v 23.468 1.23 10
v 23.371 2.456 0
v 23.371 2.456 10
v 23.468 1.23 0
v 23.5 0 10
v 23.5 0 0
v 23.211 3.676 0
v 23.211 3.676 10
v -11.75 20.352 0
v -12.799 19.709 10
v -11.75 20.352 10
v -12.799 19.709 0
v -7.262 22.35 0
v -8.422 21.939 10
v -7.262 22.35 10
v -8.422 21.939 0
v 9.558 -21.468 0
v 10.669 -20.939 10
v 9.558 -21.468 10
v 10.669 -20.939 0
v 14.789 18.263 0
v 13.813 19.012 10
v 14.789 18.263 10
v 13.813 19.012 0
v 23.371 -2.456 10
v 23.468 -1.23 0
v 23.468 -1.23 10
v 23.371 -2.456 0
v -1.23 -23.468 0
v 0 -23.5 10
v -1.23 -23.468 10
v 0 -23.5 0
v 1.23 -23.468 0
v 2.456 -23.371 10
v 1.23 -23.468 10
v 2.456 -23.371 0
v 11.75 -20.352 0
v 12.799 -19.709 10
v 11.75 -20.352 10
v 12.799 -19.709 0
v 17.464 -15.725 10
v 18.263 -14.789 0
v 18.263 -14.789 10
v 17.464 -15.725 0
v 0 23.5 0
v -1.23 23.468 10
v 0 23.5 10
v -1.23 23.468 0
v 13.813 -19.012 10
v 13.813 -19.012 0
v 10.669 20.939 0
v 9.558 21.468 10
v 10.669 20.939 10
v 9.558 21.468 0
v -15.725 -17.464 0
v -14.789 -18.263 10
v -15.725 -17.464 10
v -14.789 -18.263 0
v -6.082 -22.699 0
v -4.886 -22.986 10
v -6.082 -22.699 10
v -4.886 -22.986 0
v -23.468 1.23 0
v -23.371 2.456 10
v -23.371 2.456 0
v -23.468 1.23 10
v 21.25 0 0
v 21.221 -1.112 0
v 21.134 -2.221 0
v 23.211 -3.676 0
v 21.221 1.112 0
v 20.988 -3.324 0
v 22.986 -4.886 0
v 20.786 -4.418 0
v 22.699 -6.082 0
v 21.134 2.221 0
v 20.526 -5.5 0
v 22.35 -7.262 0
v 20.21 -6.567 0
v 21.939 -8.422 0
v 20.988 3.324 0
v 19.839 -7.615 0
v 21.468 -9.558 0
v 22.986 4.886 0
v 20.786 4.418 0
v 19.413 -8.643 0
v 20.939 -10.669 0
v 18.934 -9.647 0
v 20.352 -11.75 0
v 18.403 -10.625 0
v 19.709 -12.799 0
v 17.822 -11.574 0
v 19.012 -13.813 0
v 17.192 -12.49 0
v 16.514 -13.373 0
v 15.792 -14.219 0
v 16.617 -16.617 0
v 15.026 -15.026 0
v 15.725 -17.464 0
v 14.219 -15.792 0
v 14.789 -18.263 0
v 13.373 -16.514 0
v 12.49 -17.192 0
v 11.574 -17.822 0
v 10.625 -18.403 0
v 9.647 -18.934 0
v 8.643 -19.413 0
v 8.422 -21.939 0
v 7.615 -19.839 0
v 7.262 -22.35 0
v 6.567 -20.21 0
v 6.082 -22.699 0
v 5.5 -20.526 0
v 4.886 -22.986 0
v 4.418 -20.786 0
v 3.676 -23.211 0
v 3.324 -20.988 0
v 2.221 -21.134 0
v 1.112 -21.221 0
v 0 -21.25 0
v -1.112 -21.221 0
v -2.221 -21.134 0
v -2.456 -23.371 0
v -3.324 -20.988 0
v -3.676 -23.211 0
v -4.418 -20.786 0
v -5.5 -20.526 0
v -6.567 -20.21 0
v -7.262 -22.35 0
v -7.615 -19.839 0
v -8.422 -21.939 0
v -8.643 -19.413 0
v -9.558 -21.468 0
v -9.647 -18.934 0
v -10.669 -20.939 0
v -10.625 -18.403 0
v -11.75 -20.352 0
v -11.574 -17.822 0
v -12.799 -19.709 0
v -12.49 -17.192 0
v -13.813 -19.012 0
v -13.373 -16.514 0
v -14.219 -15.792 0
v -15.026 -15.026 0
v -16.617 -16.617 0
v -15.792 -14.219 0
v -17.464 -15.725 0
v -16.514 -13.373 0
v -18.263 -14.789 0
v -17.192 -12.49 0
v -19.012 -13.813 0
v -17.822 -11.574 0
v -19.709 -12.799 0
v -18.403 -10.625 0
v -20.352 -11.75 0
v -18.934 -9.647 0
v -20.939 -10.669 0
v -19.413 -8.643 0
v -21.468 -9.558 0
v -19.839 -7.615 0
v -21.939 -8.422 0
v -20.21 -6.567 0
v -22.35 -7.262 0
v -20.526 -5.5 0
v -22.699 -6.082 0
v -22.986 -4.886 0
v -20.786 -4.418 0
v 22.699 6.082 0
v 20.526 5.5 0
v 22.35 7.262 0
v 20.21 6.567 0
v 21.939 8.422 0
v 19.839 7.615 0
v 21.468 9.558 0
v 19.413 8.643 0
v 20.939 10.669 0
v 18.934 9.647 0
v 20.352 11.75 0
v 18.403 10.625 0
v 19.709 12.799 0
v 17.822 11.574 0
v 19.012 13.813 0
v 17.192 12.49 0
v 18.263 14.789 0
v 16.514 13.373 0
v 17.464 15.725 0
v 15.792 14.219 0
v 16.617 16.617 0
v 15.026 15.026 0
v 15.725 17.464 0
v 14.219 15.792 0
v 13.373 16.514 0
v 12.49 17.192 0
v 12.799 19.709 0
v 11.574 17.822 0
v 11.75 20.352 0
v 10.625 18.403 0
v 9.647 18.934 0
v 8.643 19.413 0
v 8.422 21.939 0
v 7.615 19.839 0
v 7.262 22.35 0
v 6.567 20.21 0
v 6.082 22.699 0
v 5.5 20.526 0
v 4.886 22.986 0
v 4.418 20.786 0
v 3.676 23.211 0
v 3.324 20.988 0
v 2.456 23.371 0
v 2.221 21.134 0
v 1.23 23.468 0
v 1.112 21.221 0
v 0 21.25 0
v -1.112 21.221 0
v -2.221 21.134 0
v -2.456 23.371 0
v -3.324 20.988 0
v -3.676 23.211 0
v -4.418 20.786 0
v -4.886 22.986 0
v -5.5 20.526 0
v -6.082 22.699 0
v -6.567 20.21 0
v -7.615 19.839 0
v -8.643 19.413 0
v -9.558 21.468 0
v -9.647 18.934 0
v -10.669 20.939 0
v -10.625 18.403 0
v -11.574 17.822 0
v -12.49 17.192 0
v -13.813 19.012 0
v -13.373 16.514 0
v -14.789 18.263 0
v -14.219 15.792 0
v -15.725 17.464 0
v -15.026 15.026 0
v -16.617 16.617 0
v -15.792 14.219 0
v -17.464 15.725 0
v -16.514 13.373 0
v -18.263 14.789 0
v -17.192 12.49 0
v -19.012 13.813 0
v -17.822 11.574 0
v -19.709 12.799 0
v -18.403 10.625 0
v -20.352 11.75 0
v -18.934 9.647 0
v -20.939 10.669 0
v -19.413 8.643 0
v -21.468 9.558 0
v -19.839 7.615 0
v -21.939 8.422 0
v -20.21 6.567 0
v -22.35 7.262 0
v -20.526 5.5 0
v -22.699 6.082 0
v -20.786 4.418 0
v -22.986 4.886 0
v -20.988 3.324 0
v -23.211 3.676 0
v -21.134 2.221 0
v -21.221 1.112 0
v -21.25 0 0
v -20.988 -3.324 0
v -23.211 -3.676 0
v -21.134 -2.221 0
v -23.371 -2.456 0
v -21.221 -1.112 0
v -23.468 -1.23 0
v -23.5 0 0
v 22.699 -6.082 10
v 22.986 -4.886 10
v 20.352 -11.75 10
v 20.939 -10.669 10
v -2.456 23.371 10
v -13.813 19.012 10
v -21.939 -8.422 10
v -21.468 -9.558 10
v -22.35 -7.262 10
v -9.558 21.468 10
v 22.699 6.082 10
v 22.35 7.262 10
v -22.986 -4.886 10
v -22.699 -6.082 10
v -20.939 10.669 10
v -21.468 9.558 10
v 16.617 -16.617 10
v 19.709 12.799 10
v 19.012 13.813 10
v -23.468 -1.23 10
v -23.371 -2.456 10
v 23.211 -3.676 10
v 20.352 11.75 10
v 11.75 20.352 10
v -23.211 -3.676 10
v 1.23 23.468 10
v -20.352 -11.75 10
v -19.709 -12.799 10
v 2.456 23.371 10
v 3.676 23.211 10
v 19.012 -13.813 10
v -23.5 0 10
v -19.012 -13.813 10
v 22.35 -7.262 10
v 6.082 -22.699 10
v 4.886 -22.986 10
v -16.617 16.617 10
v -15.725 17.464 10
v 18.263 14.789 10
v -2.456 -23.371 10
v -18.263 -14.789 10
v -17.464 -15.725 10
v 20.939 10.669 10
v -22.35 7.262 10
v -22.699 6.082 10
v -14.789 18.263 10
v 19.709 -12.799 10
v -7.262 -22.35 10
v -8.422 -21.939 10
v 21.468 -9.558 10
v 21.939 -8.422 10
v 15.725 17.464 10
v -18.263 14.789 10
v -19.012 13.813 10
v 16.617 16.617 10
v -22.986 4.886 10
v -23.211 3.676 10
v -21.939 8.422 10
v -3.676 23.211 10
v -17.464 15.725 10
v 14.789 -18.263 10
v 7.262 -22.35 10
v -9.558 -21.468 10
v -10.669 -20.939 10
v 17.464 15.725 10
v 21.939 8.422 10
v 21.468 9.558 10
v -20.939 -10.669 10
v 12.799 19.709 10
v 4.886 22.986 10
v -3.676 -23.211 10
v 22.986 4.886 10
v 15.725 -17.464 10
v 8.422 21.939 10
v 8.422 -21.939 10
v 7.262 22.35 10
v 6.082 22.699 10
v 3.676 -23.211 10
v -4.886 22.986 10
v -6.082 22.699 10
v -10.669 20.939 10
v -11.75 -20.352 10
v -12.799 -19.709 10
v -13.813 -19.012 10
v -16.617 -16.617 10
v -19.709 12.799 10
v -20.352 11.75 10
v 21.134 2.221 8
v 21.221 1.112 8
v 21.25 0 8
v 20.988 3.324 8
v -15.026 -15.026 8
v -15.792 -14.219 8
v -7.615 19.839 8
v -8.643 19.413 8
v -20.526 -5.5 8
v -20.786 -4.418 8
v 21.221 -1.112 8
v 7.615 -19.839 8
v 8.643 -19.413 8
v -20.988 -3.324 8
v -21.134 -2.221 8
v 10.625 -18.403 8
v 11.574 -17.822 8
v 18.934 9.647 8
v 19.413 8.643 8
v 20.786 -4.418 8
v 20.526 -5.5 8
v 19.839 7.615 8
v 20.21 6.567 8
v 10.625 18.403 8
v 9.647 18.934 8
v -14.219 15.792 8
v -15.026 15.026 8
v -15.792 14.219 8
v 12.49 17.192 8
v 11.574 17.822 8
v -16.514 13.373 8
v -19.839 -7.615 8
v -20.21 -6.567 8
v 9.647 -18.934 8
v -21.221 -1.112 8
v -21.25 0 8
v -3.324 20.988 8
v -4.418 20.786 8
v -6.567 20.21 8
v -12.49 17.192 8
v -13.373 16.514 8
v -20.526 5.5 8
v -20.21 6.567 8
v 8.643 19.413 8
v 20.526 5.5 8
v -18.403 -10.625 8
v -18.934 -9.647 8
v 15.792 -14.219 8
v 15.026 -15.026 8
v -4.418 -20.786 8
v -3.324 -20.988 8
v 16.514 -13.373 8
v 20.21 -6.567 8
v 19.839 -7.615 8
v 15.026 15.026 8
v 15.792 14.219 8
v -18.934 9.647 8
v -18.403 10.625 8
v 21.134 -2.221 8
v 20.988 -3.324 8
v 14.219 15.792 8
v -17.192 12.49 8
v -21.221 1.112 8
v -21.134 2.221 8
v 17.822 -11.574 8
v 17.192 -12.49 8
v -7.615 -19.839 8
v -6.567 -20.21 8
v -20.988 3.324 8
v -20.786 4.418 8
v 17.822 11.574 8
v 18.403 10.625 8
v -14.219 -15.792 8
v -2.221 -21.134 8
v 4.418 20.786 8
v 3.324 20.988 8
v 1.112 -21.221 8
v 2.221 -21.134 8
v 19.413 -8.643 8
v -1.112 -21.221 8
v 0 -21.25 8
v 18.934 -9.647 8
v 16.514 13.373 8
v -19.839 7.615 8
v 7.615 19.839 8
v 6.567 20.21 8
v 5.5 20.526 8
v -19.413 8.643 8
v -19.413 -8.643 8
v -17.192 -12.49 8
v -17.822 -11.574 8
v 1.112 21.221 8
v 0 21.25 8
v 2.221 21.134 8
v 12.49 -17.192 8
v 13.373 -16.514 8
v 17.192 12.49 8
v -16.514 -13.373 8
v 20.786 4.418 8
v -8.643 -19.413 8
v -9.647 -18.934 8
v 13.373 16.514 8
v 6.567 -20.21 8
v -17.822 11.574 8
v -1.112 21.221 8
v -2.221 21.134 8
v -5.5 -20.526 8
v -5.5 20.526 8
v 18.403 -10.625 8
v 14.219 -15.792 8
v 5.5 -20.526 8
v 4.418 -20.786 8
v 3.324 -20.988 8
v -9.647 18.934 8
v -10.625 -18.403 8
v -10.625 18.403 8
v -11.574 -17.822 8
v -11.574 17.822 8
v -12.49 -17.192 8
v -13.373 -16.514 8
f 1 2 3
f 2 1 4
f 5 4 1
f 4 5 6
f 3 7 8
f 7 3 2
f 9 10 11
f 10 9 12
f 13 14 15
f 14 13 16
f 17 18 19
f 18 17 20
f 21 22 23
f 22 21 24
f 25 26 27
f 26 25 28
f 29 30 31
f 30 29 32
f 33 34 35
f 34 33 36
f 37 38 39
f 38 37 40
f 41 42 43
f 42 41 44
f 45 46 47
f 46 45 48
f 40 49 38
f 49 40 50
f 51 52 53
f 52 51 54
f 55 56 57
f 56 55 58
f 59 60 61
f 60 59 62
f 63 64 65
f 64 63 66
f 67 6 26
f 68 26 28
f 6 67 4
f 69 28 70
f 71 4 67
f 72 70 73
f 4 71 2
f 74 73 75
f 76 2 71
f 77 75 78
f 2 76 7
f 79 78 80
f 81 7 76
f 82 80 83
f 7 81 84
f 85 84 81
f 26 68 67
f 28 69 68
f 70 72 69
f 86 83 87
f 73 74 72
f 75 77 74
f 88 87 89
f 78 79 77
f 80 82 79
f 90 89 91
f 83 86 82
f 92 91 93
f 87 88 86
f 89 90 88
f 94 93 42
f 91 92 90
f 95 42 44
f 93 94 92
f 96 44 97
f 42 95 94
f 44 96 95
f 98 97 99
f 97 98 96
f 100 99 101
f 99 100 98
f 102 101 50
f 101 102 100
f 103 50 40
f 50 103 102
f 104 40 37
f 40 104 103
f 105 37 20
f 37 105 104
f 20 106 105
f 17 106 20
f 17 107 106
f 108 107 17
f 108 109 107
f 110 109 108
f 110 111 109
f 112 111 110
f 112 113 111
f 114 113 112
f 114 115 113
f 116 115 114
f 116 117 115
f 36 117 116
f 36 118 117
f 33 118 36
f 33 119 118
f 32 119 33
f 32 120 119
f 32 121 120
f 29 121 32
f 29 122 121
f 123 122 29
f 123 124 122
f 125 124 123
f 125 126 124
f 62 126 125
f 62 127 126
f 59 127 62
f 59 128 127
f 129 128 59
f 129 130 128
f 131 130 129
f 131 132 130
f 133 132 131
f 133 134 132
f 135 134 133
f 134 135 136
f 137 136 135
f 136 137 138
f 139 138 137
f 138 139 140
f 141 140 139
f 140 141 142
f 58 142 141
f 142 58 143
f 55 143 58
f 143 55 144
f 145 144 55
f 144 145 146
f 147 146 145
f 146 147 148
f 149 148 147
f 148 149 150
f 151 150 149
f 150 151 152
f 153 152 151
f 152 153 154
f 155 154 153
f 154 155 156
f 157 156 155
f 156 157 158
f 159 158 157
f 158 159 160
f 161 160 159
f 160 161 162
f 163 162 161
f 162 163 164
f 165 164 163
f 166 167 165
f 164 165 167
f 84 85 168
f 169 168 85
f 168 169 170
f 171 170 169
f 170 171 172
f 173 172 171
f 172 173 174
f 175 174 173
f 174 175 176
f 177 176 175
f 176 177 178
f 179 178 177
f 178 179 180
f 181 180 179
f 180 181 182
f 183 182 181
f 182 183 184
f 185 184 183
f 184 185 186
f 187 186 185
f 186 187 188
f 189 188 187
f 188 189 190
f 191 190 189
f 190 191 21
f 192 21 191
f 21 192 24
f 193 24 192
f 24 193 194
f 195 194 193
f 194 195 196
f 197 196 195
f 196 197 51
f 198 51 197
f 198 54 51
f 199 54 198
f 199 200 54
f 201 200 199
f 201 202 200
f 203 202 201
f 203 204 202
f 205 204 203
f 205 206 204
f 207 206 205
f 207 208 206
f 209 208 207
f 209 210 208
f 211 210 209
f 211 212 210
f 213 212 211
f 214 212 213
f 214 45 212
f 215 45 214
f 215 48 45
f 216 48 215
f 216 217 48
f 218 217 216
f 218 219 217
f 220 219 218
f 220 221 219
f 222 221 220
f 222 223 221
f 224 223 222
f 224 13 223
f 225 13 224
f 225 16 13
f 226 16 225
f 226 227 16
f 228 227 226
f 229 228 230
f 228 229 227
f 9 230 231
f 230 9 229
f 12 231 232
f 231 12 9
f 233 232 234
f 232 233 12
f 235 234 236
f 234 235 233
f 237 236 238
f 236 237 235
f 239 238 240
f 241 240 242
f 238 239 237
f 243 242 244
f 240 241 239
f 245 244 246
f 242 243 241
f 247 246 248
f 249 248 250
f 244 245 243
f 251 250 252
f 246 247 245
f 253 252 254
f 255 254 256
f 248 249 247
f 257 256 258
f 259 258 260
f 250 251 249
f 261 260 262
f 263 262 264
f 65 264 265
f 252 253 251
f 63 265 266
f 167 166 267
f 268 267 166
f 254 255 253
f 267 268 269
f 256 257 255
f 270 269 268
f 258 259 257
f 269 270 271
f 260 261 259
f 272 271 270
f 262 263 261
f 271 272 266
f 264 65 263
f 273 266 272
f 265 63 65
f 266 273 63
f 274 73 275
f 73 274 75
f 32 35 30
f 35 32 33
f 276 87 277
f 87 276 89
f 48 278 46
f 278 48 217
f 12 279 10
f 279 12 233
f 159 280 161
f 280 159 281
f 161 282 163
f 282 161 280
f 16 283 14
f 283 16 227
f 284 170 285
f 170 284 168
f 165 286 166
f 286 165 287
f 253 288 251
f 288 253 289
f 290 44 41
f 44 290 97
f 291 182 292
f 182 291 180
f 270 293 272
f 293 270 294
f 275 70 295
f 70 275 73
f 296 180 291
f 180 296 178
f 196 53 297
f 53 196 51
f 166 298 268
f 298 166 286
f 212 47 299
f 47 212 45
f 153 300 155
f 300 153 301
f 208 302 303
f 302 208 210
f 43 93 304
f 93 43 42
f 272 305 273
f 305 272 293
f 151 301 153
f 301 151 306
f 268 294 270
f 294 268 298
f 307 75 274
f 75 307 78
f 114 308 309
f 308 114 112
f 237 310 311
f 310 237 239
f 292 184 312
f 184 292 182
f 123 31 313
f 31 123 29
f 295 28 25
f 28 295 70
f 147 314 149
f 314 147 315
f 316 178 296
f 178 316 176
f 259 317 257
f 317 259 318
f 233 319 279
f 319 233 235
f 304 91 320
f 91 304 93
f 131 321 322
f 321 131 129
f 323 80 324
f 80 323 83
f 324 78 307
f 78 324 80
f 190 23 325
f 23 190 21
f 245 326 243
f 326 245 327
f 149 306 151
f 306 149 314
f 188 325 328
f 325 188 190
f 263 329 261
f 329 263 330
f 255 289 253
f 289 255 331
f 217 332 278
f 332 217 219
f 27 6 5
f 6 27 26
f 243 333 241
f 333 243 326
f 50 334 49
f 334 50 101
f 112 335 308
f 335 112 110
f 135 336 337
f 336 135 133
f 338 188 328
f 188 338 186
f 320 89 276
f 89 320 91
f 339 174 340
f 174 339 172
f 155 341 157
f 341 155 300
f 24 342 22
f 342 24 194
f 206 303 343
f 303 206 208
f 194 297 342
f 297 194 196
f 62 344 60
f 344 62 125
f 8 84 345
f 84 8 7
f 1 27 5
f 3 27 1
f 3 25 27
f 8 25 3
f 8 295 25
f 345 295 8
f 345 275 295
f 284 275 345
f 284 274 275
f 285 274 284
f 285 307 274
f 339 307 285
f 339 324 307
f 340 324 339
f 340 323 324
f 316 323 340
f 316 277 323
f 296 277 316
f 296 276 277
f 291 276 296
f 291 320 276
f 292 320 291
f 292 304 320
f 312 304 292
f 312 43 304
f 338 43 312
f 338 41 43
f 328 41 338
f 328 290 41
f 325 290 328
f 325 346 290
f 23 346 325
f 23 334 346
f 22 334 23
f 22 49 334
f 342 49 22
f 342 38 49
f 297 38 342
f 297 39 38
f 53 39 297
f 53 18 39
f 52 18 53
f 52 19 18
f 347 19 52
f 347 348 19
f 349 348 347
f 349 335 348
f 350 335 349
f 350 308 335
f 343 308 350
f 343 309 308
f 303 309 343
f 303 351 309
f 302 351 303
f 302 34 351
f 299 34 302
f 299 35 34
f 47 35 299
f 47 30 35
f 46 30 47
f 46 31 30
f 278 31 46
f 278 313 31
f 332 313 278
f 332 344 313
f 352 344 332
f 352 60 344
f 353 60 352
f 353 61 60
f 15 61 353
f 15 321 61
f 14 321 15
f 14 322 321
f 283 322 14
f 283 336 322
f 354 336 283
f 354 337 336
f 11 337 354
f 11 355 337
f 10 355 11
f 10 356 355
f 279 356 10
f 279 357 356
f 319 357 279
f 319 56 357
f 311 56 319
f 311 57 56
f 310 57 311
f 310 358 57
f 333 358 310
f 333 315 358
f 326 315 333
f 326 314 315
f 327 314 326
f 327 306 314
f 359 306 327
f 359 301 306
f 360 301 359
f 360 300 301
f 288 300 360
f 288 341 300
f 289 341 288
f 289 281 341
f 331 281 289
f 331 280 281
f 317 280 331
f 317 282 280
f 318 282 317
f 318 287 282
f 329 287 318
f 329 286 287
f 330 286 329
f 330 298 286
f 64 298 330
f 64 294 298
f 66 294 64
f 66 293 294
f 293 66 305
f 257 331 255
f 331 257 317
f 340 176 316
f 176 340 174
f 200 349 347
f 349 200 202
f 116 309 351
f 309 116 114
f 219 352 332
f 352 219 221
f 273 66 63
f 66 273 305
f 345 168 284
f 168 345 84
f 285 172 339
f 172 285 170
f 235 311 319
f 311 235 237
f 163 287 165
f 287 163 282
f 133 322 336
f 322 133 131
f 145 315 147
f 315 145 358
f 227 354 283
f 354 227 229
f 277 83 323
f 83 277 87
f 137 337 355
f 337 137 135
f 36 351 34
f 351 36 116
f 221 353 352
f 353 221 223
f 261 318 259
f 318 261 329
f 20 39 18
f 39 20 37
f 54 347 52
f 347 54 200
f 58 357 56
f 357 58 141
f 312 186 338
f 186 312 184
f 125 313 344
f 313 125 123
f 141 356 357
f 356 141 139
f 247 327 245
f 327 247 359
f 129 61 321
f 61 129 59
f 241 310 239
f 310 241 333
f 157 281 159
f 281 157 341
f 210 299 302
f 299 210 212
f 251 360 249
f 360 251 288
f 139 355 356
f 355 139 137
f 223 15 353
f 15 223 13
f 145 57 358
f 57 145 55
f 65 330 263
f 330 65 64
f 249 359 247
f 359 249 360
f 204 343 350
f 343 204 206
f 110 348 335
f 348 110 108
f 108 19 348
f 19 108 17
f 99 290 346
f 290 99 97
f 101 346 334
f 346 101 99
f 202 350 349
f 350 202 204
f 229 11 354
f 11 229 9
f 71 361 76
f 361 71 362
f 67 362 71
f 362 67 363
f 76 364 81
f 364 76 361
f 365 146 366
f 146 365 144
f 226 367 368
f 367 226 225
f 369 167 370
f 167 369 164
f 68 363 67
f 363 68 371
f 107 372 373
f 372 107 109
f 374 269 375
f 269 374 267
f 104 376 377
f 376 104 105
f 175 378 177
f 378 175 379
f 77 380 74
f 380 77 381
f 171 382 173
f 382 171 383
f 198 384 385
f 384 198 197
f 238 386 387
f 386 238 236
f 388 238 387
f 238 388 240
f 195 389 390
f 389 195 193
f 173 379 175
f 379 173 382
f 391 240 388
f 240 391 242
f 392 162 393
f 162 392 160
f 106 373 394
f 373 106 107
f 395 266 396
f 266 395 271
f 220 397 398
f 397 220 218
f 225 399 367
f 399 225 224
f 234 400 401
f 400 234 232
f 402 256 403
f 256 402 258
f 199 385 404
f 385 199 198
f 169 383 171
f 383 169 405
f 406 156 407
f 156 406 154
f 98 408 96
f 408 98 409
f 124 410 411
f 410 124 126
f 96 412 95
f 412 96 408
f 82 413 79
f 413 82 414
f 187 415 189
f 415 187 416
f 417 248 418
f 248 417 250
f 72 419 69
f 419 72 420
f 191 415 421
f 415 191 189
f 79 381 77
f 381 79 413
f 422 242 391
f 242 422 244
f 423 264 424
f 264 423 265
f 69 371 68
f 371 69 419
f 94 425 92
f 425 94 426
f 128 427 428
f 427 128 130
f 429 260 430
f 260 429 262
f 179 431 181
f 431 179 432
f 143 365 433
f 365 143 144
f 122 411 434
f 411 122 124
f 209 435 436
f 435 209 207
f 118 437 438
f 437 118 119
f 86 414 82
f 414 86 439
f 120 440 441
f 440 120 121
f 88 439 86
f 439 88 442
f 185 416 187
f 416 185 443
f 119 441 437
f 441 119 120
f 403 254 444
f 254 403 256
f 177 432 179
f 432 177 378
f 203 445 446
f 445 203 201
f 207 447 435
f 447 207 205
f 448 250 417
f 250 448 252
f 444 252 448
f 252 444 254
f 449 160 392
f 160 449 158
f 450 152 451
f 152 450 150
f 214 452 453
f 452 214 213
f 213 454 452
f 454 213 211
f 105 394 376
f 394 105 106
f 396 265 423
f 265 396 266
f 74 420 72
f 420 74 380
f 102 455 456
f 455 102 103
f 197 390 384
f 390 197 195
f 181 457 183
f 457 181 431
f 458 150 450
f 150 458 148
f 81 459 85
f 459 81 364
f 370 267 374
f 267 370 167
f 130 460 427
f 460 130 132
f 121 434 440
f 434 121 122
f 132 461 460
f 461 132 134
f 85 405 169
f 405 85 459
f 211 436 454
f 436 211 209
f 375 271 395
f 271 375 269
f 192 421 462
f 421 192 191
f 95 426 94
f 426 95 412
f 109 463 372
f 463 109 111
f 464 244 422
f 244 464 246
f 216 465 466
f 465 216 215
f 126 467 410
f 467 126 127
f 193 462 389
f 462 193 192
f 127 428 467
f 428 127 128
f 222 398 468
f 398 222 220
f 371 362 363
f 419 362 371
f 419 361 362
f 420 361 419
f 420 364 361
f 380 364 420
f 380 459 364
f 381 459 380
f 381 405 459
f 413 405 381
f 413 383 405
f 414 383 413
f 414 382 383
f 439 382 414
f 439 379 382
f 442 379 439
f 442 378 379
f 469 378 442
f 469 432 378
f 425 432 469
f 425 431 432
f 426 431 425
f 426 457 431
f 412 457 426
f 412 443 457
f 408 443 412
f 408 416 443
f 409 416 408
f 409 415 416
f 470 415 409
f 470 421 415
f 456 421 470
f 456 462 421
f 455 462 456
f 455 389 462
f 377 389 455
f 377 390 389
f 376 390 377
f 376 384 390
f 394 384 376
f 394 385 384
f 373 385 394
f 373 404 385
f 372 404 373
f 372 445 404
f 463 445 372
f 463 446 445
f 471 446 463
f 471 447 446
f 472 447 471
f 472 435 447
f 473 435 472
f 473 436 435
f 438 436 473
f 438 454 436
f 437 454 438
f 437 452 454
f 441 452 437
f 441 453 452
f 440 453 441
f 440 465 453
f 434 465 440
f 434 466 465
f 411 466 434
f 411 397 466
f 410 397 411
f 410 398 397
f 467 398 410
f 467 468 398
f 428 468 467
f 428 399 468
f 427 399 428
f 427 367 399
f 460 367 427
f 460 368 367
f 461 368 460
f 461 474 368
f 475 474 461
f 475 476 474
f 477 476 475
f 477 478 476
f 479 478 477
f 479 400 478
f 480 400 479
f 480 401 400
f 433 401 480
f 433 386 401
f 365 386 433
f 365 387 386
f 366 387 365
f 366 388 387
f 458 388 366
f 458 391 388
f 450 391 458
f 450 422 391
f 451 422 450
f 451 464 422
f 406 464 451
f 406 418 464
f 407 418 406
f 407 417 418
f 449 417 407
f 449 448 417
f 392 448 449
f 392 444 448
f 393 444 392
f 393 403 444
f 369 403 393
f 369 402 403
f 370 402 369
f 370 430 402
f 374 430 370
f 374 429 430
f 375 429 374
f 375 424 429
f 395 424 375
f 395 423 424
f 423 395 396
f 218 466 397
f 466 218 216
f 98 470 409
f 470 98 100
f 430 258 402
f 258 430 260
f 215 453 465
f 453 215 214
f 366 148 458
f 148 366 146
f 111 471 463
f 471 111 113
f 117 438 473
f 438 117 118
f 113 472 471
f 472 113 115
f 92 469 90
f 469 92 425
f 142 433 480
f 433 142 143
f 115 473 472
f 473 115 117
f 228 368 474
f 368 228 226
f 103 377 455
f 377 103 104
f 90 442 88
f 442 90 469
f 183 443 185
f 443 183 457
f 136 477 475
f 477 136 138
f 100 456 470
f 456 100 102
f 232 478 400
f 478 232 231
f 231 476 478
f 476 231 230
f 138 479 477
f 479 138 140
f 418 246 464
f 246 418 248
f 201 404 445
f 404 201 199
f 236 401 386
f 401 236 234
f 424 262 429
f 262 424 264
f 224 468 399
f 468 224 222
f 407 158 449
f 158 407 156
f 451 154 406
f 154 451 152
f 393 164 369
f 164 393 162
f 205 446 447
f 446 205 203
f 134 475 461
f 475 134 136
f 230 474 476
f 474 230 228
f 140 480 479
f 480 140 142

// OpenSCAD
// Cap for the metal rods in the garden.

difference() {
    cylinder(r=23.5, h=10, $fn=120);
    cylinder(r=21.25, h=8, $fn=120);    
}
